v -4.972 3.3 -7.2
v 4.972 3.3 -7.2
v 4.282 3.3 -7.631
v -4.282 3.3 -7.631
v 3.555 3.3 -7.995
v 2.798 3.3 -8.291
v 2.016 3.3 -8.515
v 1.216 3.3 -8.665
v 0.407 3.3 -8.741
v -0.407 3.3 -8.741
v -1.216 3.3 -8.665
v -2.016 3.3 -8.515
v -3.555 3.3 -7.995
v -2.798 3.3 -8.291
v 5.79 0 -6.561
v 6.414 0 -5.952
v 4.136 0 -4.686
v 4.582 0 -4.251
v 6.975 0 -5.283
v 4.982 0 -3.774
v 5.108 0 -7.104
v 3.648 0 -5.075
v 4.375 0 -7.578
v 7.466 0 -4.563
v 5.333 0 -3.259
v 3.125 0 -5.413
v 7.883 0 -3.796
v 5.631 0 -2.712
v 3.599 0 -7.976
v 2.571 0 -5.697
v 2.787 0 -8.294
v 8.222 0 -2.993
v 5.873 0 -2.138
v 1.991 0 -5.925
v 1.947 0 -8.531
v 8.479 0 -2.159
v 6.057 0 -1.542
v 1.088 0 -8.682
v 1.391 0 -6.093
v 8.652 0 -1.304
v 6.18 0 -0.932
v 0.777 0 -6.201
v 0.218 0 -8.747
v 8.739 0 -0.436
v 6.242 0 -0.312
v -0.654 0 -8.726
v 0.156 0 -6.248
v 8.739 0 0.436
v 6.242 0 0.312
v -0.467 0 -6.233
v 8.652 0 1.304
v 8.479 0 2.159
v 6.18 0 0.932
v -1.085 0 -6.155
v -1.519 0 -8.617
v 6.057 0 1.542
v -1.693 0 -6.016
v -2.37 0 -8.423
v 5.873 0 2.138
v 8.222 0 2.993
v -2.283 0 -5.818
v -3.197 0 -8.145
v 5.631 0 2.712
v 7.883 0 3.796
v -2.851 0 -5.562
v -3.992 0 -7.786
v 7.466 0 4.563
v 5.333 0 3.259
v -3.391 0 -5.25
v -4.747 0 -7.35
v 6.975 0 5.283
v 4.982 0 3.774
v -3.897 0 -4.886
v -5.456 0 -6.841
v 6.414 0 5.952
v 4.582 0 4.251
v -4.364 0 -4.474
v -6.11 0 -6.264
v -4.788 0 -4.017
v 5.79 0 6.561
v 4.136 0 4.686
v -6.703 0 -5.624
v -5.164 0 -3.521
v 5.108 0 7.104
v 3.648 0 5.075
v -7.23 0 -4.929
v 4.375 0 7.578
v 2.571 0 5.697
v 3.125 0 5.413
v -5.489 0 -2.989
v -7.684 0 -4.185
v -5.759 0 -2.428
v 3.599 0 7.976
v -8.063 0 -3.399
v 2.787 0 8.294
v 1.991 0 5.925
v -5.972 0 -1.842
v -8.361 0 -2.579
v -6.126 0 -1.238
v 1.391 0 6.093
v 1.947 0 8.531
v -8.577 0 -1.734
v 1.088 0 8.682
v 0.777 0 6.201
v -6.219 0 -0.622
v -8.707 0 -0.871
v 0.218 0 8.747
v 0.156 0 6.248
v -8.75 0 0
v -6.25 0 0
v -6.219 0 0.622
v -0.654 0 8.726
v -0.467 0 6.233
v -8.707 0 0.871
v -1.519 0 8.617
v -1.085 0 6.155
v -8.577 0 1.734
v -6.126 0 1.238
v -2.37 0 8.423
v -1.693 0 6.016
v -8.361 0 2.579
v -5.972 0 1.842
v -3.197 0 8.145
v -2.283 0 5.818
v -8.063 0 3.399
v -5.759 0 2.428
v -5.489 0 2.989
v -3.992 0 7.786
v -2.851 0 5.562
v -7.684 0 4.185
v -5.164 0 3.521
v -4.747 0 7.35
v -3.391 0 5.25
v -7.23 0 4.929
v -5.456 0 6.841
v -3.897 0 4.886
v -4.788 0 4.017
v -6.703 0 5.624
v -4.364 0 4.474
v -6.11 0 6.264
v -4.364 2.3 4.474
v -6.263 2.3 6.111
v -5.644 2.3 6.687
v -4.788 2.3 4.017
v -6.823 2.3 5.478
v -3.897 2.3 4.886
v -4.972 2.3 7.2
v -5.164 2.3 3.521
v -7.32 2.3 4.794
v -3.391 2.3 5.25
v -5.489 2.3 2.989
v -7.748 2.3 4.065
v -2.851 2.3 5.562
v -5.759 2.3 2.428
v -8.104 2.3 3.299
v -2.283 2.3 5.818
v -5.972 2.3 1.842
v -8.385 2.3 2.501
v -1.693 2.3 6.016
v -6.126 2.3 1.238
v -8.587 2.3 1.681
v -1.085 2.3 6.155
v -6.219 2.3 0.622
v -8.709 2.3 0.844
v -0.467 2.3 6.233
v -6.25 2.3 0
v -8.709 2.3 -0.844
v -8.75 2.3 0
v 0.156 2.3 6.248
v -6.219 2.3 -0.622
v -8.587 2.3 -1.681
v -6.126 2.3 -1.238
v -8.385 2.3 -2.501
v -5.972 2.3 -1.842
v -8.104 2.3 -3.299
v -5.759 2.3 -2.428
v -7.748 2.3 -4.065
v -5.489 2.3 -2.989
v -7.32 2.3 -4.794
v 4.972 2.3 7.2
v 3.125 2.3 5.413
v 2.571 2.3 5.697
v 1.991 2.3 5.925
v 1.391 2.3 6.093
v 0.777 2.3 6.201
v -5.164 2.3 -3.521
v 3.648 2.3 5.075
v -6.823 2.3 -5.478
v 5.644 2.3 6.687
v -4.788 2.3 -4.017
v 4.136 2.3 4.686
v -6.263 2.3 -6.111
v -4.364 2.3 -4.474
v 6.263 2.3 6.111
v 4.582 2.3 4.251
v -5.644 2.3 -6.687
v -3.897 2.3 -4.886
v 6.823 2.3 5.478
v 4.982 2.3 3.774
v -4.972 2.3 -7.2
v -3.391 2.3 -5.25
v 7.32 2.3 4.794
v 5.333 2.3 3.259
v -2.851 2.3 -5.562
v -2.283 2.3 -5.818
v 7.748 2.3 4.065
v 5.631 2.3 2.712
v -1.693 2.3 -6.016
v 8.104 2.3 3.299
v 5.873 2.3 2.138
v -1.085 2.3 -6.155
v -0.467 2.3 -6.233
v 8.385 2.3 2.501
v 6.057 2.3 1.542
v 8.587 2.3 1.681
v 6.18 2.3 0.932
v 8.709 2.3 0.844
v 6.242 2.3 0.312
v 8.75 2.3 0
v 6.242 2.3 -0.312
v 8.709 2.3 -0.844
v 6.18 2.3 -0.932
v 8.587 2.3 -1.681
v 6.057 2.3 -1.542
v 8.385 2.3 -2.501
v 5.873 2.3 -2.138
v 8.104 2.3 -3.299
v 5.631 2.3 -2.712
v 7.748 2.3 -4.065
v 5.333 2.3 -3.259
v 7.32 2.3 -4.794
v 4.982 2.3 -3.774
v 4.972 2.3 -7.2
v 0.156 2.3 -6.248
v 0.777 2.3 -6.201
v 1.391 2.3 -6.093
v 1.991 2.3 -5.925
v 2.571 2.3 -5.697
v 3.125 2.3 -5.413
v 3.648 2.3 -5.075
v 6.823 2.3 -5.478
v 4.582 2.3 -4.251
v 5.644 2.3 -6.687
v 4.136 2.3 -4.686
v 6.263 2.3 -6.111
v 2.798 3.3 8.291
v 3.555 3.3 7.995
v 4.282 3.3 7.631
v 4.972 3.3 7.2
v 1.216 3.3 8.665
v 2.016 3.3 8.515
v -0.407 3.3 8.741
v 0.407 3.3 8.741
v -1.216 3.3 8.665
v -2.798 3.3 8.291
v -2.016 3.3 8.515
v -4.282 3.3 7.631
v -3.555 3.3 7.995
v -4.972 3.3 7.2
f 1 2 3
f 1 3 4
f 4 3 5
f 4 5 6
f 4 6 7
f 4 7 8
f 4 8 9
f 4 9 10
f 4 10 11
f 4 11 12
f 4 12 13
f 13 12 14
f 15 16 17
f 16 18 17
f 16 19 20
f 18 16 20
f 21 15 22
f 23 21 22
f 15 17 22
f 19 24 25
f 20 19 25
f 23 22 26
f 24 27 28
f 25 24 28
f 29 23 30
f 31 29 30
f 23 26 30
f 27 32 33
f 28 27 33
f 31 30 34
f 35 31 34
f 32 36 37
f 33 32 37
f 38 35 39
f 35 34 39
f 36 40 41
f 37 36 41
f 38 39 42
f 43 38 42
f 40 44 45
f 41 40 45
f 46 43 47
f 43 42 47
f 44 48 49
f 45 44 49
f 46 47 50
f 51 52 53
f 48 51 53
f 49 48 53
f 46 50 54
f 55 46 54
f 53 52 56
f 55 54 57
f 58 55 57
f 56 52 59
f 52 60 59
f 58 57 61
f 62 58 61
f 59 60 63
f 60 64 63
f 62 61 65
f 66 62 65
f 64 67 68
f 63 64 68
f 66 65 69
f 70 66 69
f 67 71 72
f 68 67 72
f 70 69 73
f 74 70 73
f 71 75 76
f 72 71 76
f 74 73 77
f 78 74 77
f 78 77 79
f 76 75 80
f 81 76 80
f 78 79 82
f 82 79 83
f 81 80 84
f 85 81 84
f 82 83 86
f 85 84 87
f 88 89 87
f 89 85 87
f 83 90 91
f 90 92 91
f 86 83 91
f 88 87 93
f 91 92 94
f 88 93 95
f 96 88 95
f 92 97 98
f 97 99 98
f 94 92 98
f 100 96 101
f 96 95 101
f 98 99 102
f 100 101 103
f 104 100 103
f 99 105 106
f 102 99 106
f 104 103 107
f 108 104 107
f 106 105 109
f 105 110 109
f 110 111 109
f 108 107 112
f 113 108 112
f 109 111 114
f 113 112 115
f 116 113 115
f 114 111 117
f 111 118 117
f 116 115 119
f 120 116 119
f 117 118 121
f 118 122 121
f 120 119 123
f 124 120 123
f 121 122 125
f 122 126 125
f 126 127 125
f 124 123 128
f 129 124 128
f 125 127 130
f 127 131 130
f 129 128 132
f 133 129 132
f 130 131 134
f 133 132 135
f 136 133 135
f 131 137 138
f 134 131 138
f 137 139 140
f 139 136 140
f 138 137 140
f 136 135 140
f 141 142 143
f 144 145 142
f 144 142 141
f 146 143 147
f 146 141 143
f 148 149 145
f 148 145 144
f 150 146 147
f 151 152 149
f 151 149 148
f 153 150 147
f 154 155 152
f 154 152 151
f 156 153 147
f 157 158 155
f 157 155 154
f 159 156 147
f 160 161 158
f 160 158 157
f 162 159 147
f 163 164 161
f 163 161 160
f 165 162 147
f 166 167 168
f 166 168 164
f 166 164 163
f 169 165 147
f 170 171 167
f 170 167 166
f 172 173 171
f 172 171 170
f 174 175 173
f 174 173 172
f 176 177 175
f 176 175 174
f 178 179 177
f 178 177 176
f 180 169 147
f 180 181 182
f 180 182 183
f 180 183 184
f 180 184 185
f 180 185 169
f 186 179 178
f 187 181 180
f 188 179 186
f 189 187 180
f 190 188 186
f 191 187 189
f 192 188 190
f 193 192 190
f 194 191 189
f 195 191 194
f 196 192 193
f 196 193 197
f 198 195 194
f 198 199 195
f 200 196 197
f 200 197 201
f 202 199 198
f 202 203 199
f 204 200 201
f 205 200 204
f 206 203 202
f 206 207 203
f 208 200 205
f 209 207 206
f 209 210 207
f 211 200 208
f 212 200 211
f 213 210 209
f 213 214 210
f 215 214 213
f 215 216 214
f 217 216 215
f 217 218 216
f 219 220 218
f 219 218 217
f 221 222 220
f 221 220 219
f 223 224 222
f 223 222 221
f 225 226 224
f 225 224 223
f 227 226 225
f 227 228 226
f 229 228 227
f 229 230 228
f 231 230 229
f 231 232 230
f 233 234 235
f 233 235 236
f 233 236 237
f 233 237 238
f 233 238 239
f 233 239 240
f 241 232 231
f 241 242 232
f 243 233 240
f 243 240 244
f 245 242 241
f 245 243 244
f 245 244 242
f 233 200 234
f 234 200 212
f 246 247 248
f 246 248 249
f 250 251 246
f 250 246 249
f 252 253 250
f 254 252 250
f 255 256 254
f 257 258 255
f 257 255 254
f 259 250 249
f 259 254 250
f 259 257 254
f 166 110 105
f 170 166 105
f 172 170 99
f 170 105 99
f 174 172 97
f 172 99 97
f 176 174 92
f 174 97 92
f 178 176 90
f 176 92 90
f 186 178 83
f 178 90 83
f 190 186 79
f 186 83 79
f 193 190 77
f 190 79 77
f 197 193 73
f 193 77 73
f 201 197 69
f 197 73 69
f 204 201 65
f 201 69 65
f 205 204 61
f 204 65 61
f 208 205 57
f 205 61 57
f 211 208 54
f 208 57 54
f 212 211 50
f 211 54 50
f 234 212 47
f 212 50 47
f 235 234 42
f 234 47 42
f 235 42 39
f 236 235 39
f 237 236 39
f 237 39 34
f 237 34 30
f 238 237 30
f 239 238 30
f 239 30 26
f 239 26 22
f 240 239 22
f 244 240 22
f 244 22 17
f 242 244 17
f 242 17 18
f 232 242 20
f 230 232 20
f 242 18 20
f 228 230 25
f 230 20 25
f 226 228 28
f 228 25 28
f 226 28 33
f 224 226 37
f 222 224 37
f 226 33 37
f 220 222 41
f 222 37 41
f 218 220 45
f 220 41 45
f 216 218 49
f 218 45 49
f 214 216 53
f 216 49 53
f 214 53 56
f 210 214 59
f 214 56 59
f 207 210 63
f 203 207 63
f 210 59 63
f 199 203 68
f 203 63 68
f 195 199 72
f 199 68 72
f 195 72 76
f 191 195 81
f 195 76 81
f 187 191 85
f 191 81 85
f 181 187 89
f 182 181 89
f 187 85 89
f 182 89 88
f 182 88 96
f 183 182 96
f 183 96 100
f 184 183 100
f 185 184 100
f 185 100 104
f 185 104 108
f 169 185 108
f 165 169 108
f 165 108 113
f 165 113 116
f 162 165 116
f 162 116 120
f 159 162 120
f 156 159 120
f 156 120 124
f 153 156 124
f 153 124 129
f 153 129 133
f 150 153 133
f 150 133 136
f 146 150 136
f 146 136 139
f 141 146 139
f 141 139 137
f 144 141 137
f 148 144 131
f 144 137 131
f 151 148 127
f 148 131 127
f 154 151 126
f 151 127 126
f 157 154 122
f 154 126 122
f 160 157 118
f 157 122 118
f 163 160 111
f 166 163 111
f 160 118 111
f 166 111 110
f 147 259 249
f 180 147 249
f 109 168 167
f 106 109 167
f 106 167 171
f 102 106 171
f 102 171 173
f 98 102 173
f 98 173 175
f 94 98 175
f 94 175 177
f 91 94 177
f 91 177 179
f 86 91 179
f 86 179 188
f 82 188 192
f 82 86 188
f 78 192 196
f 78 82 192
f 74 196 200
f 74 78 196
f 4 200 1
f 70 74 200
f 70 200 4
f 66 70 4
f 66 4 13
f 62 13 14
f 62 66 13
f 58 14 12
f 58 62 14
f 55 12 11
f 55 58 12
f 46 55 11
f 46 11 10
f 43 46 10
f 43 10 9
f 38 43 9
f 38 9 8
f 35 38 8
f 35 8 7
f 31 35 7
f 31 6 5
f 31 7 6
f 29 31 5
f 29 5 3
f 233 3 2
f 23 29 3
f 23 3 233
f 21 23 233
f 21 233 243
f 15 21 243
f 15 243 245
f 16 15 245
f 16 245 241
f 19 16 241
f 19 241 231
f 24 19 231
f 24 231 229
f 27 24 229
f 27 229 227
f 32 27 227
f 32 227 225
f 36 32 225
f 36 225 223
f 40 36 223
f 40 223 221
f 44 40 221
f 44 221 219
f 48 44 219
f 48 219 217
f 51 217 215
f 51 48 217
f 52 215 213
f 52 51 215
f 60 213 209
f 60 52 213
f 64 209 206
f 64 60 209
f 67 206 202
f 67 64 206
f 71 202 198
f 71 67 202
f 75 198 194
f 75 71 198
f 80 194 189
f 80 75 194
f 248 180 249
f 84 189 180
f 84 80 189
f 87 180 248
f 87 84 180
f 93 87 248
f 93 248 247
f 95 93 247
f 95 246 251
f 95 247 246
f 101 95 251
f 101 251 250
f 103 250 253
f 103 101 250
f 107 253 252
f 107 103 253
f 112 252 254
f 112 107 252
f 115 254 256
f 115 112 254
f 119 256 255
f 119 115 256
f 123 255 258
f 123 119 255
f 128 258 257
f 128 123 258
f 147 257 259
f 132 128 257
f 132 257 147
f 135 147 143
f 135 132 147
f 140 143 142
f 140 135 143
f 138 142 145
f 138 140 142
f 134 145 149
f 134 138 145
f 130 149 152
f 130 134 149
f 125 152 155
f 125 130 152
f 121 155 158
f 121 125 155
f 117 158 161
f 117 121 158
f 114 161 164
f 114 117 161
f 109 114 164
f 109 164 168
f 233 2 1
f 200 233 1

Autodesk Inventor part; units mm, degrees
ref_plane "YZ Plane" through (0, 0, 0) normal (1, 0, 0) x (0, 1, 0)
ref_plane "XZ Plane" through (0, 0, 0) normal (0, 1, 0) x (-1, 0, 0)
ref_plane "XY Plane" through (0, 0, 0) normal (0, 0, 1) x (1, 0, 0)
sketch "Sketch1" plane through (0, 0, 0) normal (0, 1, 0) x (-1, 0, 0)
  circle A0 centre (0, 0) radius 8.75
  circle A1 centre (0, 0) radius 6.25
  dimension "d0" = 17.5
  dimension "d1" = 12.5
extrude "Extrusion1" add sketch "Sketch1" along normal blind 3.3
sketch "Sketch2" plane through (0, 3.3, 0) normal (0, 1, 0) x (1, 0, 0)
  circle A0 centre (0, 0) radius 8.75 projected
  line L0 (-4.9722, -7.2) -> (4.9722, -7.2)
  line L1 (4.9722, 7.2) -> (-4.9722, 7.2)
  line L2 (-12.7989, 0) -> (12.7989, 0) construction
  dimension "d4" = 14.4
extrude "Extrusion2" cut sketch "Sketch2" against normal blind 1 contours A0 L0 L1
properties part number "Toggle_Collar" material "PC/ABS Plastic"
